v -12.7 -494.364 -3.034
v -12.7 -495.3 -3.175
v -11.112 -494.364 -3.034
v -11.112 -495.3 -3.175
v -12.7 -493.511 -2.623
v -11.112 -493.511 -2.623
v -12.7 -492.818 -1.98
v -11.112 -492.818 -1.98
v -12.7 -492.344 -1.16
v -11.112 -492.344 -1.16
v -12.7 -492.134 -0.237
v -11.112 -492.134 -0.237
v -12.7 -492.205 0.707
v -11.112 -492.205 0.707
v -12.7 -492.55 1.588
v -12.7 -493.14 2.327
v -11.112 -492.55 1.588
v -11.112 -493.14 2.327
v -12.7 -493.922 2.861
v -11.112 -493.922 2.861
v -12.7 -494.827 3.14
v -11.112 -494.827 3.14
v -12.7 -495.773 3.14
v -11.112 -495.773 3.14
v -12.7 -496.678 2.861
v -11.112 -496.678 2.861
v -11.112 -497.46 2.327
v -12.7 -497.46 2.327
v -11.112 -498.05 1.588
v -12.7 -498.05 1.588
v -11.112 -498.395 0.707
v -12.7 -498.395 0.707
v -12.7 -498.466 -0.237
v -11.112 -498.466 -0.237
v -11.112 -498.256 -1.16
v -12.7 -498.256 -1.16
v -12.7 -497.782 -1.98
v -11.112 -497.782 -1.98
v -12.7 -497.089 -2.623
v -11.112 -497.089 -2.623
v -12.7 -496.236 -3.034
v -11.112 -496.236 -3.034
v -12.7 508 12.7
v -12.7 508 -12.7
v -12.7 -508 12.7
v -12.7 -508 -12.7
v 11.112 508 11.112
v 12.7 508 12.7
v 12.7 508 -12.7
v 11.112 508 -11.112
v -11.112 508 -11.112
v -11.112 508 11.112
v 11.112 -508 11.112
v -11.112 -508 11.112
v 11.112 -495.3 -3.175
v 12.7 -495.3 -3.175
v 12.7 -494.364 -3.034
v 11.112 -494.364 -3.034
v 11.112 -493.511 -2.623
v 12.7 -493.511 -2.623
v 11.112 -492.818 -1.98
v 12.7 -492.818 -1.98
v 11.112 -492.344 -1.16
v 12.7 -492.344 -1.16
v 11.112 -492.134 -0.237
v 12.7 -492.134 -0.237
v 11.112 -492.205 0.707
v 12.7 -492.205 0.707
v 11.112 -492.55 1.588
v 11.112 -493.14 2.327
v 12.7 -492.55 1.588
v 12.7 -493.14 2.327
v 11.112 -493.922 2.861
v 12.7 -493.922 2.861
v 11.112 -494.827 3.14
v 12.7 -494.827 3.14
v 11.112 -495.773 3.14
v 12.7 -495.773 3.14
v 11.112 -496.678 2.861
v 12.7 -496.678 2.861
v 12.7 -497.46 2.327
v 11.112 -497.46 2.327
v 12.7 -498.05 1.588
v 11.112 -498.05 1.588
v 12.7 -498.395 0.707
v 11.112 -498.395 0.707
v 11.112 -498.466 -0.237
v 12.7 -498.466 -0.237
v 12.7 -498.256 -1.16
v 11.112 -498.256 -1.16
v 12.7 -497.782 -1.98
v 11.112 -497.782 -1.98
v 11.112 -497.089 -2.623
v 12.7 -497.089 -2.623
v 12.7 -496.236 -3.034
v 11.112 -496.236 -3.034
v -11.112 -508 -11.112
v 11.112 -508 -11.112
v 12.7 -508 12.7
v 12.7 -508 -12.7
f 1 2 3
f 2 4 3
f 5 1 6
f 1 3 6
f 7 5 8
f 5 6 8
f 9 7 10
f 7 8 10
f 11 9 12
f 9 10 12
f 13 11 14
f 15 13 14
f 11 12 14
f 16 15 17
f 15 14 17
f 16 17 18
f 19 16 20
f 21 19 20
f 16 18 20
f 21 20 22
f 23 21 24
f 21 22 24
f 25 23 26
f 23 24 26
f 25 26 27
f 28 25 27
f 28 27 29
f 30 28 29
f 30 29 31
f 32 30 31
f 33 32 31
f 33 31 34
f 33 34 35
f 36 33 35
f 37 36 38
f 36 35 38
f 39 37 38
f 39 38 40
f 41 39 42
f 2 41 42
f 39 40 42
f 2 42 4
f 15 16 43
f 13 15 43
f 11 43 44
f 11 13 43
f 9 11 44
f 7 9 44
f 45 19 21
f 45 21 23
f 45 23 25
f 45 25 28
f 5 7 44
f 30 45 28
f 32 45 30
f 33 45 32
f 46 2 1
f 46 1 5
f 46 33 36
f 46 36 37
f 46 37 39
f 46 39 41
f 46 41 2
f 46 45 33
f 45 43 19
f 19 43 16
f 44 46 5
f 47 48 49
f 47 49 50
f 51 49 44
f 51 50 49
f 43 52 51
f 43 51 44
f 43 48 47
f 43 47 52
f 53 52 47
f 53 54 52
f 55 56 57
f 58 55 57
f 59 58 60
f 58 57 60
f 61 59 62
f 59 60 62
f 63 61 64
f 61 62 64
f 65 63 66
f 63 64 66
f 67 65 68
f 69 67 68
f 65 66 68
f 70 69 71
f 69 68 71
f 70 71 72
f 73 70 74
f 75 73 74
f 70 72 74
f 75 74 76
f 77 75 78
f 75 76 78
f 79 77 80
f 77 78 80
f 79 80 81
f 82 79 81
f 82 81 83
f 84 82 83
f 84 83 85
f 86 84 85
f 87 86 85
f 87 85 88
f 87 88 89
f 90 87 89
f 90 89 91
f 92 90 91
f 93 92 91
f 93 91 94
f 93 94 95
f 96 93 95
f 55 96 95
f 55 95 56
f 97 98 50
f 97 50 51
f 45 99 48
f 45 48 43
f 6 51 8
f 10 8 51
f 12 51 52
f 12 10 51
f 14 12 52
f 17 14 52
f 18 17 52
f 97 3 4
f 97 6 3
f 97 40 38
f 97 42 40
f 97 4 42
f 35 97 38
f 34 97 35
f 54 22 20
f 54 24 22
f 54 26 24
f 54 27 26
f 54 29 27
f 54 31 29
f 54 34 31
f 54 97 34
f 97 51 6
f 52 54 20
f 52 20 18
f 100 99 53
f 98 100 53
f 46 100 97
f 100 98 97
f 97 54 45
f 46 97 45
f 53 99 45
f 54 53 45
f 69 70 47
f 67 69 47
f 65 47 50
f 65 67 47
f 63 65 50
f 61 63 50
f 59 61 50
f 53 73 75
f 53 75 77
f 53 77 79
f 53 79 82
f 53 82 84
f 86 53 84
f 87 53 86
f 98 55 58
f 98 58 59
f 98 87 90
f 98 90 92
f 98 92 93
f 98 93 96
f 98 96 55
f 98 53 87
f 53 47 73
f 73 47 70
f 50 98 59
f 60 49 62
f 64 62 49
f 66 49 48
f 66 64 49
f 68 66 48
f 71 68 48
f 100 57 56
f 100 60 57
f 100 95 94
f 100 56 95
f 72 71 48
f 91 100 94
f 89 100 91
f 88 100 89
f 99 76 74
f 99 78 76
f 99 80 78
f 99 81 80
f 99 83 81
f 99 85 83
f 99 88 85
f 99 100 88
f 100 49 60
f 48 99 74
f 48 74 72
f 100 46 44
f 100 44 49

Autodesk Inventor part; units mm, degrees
ref_plane "YZ Plane" through (0, 0, 0) normal (1, 0, 0) x (0, 1, 0)
ref_plane "XZ Plane" through (0, 0, 0) normal (0, 1, 0) x (-1, 0, 0)
ref_plane "XY Plane" through (0, 0, 0) normal (0, 0, 1) x (1, 0, 0)
sketch "Sketch1" plane through (0, 0, 0) normal (0, 1, 0) x (-1, 0, 0)
  line L0 (-12.7, 12.7) -> (12.7, 12.7)
  line L1 (12.7, 12.7) -> (12.7, -12.7)
  line L2 (12.7, -12.7) -> (-12.7, -12.7)
  line L3 (-12.7, -12.7) -> (-12.7, 12.7)
  line L4 (-12.7, 12.7) -> (12.7, -12.7) construction
  line L5 (12.7, 12.7) -> (-12.7, -12.7) construction
  line L6 (11.1125, -11.1125) -> (11.1125, 11.1125)
  line L7 (11.1125, 11.1125) -> (-11.1125, 11.1125)
  line L8 (-11.1125, 11.1125) -> (-11.1125, -11.1125)
  line L9 (-11.1125, -11.1125) -> (11.1125, -11.1125)
  point P0 (0, 0)
  dimension "d0" = 25.4
  dimension "d1" = 1.5875
extrude "Extrusion1" add sketch "Sketch1" along normal mid plane 1016
sketch "Sketch2" plane through (12.7, -508, -12.7) normal (1, 0, 0) x (0, 0, -1)
  circle A0 centre (-12.7, 12.7) radius 3.175
  line L0 (-12.7, 12.7) -> (-12.7, 0) construction
  line L1 (-23.8125, 0) -> (-1.5875, 0) construction
  point P0 (-12.7, 508)
  dimension "d4" = 6.35
  dimension "d5" = 12.7
extrude "Extrusion2" cut sketch "Sketch2" against normal through all
properties part number "climb bar"
